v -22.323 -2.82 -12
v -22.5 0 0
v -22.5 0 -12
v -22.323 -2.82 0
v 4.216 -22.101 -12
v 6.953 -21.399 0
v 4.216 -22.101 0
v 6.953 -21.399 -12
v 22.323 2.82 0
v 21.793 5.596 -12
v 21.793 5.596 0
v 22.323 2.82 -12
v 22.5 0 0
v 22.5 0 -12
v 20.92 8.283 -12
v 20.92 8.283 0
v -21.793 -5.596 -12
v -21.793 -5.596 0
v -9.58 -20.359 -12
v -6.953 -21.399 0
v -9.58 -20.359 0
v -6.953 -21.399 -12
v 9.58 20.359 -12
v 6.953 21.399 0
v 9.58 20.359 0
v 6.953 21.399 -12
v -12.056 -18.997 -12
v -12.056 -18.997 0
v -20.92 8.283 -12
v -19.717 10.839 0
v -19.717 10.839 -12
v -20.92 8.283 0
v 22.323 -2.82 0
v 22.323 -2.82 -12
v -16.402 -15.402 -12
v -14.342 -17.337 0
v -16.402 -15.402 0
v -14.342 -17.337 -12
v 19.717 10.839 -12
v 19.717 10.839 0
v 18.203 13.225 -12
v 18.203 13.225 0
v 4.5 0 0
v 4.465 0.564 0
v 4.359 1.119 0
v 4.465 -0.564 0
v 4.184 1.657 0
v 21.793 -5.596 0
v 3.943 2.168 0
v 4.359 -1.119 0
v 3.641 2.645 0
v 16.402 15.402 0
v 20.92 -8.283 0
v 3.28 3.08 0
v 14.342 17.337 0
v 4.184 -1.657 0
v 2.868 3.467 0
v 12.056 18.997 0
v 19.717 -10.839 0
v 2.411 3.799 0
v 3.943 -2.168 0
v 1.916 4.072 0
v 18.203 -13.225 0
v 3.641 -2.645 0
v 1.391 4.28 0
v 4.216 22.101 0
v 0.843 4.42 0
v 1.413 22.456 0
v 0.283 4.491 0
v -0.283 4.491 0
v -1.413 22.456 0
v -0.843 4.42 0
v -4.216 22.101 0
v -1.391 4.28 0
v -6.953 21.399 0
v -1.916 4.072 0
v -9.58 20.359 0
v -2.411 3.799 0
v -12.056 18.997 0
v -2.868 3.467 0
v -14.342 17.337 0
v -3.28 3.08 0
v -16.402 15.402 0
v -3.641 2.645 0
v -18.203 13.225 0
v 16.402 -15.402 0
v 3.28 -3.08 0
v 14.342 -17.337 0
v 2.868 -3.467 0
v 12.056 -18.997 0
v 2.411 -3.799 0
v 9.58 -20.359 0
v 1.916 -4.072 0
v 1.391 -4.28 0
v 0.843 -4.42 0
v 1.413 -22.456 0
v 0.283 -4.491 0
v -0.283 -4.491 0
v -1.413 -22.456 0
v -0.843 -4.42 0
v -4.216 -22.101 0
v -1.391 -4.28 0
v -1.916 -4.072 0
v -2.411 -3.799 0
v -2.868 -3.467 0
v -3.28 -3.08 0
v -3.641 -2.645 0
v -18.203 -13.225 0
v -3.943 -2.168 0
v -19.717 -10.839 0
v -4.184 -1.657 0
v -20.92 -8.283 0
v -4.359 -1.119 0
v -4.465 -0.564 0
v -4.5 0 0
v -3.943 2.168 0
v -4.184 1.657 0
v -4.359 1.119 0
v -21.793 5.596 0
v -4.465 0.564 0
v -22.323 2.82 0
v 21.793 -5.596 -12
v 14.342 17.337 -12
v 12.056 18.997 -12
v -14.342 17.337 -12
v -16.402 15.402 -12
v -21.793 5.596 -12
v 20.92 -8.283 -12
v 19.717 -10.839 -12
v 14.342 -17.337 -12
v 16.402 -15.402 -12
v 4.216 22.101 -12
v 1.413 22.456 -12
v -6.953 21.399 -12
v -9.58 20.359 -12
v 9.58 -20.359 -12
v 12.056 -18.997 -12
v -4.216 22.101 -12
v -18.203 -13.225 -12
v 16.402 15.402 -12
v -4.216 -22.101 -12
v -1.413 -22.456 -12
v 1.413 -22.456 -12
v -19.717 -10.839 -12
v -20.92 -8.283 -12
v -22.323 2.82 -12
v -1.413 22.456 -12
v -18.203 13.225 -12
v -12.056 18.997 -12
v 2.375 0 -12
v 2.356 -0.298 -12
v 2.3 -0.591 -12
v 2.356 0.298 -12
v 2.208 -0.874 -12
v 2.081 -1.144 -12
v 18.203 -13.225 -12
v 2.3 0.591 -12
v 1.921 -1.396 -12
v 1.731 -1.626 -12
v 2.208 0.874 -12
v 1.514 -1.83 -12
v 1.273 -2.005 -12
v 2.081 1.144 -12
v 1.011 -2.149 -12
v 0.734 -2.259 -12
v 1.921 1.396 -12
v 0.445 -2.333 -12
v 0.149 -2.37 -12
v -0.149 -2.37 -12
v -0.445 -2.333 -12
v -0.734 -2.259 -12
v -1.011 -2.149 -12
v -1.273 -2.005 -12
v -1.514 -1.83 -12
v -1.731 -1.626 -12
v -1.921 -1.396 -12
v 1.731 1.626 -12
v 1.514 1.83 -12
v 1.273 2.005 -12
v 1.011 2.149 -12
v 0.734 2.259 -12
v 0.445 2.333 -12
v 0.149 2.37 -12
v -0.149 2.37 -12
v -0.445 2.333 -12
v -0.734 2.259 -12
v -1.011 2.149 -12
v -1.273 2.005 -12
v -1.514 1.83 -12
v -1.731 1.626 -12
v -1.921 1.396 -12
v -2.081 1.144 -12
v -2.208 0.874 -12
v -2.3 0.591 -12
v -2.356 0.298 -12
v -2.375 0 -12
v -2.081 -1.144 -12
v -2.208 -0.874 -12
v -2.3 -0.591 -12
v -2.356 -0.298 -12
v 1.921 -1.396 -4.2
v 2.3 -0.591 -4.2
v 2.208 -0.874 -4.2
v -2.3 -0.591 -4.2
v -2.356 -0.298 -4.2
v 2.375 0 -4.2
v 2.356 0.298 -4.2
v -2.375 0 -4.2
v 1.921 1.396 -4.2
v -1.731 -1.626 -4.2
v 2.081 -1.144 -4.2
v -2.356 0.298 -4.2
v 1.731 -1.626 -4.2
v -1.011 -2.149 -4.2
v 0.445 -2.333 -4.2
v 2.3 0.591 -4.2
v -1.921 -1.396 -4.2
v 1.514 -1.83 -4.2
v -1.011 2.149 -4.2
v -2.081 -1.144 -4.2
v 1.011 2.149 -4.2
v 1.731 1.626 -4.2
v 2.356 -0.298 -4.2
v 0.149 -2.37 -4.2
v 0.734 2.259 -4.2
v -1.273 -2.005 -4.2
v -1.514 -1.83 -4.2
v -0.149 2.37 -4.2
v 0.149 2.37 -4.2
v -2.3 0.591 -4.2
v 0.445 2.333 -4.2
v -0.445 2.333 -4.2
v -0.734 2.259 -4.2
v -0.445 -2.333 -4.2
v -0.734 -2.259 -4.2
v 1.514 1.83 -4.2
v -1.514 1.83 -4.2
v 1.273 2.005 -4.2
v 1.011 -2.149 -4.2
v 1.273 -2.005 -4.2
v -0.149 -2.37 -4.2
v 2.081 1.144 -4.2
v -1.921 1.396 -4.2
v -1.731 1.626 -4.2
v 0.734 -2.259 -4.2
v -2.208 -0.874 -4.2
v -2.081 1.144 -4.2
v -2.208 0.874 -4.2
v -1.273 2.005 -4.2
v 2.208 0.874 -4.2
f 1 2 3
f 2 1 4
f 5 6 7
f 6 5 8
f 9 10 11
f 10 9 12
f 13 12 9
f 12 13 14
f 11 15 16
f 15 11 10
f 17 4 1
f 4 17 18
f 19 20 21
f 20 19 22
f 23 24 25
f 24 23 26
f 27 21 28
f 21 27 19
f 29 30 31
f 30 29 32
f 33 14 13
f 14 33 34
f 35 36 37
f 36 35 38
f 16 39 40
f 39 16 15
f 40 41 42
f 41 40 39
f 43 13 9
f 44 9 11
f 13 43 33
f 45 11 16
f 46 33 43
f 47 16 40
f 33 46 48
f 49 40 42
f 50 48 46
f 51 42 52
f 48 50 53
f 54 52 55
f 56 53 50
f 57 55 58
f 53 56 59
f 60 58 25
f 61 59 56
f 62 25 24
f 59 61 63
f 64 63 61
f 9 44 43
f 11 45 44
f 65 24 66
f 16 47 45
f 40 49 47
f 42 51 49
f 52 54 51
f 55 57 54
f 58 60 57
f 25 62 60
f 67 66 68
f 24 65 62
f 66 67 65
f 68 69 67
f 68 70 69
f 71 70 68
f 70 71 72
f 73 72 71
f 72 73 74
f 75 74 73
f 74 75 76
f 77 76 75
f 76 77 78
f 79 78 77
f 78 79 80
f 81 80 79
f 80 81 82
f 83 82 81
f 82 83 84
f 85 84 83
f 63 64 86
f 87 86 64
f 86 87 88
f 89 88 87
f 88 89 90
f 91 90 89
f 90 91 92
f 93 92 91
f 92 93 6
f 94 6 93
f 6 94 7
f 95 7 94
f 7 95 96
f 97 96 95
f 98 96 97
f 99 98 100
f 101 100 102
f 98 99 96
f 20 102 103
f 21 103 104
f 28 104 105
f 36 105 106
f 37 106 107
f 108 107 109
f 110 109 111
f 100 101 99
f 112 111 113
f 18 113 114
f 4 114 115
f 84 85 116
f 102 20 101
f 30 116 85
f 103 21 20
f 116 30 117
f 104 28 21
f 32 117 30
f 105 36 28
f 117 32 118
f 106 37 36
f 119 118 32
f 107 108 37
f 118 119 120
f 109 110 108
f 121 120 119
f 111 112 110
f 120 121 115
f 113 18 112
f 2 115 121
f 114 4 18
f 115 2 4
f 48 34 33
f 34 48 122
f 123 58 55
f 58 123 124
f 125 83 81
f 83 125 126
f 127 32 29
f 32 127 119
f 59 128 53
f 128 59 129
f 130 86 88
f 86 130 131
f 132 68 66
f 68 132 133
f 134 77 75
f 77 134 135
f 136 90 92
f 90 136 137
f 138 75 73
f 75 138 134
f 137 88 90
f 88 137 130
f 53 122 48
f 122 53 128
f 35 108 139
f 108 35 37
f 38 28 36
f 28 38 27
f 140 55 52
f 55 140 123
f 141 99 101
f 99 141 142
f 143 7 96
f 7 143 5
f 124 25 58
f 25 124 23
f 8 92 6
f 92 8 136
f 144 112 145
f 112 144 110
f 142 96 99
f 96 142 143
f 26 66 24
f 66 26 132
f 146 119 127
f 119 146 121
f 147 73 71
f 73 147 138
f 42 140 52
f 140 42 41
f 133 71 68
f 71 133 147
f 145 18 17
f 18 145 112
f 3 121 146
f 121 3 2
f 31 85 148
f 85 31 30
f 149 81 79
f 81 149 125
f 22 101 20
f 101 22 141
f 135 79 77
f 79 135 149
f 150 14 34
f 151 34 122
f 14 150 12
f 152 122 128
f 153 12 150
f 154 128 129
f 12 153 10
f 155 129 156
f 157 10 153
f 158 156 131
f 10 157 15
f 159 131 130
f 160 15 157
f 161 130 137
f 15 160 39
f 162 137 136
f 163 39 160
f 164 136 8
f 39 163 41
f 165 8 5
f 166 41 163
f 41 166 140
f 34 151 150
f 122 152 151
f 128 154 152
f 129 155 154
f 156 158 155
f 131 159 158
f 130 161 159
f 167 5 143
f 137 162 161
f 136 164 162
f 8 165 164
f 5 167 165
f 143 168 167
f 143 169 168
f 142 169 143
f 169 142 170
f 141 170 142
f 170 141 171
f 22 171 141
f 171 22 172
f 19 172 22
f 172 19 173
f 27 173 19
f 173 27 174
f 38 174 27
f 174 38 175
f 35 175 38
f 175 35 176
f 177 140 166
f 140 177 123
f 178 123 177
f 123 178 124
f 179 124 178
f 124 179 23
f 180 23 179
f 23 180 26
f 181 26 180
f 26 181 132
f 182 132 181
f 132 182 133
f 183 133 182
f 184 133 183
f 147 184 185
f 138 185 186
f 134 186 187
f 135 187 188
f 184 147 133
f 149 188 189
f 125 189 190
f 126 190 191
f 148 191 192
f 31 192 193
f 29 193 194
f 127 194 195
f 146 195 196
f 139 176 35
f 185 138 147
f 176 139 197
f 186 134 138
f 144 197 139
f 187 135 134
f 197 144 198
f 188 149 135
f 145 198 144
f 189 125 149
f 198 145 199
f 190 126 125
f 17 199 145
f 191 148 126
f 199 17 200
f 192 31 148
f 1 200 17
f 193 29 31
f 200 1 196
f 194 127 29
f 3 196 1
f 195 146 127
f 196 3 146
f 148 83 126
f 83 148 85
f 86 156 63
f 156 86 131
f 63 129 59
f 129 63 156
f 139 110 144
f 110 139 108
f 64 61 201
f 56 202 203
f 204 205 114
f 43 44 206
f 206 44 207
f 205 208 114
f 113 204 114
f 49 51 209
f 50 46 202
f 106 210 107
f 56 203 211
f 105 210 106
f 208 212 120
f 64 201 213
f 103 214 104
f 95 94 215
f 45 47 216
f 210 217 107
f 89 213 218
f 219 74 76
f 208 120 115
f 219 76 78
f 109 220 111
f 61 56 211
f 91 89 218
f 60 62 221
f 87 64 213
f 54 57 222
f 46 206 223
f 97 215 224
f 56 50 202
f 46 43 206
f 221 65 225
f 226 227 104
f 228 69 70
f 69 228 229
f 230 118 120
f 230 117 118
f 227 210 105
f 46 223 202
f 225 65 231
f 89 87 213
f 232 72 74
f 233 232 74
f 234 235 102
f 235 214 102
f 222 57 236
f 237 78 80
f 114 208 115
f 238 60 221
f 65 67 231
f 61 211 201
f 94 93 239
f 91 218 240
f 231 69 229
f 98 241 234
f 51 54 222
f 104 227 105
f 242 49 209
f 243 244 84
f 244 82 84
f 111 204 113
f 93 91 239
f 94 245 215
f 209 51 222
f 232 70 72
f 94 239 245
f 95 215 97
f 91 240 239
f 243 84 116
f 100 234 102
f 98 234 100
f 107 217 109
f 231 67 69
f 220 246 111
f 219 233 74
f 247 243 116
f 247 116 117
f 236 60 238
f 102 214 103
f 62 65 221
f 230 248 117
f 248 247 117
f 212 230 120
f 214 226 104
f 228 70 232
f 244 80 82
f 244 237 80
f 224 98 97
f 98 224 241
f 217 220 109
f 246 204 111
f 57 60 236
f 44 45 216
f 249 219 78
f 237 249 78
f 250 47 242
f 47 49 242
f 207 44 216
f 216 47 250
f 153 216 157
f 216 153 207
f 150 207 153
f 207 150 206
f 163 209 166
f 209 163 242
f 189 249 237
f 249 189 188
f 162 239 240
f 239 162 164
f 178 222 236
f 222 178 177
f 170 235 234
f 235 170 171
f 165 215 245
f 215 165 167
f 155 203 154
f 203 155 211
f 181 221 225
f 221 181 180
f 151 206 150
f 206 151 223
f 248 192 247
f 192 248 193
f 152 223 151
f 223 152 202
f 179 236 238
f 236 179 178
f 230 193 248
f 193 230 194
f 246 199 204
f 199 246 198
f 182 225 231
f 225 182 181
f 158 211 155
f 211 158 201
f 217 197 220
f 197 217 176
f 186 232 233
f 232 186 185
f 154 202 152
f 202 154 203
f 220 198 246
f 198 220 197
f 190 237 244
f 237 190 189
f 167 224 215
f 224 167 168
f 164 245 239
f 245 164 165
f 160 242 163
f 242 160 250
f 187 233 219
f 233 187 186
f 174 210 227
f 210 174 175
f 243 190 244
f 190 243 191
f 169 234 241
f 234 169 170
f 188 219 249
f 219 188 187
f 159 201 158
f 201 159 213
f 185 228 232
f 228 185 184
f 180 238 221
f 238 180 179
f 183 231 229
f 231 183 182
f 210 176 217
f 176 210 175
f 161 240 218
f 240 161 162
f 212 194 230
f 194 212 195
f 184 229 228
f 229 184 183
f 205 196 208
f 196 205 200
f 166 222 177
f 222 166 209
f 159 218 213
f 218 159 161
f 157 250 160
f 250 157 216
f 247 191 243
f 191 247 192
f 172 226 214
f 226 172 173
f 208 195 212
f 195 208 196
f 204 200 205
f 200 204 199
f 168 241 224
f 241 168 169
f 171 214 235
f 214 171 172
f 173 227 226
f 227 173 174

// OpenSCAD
$fn = 50;


difference() {
	union() {
		translate(v = [0, 0, -12.0000000000]) {
			cylinder(h = 12, r = 22.5000000000);
		}
		translate(v = [0, 0, -12.0000000000]) {
			cylinder(h = 12, r = 2.8750000000);
		}
	}
	union() {
		translate(v = [0, 0, 0]) {
			rotate(a = [0, 0, 0]) {
				difference() {
					union() {
						translate(v = [0, 0, -12.0000000000]) {
							cylinder(h = 12, r = 2.2500000000);
						}
						translate(v = [0, 0, -4.2000000000]) {
							cylinder(h = 4.2000000000, r1 = 2.3750000000, r2 = 4.5000000000);
						}
						translate(v = [0, 0, -12.0000000000]) {
							cylinder(h = 12, r = 2.3750000000);
						}
						translate(v = [0, 0, -12.0000000000]) {
							cylinder(h = 12, r = 2.2500000000);
						}
					}
					union();
				}
			}
		}
	}
}
